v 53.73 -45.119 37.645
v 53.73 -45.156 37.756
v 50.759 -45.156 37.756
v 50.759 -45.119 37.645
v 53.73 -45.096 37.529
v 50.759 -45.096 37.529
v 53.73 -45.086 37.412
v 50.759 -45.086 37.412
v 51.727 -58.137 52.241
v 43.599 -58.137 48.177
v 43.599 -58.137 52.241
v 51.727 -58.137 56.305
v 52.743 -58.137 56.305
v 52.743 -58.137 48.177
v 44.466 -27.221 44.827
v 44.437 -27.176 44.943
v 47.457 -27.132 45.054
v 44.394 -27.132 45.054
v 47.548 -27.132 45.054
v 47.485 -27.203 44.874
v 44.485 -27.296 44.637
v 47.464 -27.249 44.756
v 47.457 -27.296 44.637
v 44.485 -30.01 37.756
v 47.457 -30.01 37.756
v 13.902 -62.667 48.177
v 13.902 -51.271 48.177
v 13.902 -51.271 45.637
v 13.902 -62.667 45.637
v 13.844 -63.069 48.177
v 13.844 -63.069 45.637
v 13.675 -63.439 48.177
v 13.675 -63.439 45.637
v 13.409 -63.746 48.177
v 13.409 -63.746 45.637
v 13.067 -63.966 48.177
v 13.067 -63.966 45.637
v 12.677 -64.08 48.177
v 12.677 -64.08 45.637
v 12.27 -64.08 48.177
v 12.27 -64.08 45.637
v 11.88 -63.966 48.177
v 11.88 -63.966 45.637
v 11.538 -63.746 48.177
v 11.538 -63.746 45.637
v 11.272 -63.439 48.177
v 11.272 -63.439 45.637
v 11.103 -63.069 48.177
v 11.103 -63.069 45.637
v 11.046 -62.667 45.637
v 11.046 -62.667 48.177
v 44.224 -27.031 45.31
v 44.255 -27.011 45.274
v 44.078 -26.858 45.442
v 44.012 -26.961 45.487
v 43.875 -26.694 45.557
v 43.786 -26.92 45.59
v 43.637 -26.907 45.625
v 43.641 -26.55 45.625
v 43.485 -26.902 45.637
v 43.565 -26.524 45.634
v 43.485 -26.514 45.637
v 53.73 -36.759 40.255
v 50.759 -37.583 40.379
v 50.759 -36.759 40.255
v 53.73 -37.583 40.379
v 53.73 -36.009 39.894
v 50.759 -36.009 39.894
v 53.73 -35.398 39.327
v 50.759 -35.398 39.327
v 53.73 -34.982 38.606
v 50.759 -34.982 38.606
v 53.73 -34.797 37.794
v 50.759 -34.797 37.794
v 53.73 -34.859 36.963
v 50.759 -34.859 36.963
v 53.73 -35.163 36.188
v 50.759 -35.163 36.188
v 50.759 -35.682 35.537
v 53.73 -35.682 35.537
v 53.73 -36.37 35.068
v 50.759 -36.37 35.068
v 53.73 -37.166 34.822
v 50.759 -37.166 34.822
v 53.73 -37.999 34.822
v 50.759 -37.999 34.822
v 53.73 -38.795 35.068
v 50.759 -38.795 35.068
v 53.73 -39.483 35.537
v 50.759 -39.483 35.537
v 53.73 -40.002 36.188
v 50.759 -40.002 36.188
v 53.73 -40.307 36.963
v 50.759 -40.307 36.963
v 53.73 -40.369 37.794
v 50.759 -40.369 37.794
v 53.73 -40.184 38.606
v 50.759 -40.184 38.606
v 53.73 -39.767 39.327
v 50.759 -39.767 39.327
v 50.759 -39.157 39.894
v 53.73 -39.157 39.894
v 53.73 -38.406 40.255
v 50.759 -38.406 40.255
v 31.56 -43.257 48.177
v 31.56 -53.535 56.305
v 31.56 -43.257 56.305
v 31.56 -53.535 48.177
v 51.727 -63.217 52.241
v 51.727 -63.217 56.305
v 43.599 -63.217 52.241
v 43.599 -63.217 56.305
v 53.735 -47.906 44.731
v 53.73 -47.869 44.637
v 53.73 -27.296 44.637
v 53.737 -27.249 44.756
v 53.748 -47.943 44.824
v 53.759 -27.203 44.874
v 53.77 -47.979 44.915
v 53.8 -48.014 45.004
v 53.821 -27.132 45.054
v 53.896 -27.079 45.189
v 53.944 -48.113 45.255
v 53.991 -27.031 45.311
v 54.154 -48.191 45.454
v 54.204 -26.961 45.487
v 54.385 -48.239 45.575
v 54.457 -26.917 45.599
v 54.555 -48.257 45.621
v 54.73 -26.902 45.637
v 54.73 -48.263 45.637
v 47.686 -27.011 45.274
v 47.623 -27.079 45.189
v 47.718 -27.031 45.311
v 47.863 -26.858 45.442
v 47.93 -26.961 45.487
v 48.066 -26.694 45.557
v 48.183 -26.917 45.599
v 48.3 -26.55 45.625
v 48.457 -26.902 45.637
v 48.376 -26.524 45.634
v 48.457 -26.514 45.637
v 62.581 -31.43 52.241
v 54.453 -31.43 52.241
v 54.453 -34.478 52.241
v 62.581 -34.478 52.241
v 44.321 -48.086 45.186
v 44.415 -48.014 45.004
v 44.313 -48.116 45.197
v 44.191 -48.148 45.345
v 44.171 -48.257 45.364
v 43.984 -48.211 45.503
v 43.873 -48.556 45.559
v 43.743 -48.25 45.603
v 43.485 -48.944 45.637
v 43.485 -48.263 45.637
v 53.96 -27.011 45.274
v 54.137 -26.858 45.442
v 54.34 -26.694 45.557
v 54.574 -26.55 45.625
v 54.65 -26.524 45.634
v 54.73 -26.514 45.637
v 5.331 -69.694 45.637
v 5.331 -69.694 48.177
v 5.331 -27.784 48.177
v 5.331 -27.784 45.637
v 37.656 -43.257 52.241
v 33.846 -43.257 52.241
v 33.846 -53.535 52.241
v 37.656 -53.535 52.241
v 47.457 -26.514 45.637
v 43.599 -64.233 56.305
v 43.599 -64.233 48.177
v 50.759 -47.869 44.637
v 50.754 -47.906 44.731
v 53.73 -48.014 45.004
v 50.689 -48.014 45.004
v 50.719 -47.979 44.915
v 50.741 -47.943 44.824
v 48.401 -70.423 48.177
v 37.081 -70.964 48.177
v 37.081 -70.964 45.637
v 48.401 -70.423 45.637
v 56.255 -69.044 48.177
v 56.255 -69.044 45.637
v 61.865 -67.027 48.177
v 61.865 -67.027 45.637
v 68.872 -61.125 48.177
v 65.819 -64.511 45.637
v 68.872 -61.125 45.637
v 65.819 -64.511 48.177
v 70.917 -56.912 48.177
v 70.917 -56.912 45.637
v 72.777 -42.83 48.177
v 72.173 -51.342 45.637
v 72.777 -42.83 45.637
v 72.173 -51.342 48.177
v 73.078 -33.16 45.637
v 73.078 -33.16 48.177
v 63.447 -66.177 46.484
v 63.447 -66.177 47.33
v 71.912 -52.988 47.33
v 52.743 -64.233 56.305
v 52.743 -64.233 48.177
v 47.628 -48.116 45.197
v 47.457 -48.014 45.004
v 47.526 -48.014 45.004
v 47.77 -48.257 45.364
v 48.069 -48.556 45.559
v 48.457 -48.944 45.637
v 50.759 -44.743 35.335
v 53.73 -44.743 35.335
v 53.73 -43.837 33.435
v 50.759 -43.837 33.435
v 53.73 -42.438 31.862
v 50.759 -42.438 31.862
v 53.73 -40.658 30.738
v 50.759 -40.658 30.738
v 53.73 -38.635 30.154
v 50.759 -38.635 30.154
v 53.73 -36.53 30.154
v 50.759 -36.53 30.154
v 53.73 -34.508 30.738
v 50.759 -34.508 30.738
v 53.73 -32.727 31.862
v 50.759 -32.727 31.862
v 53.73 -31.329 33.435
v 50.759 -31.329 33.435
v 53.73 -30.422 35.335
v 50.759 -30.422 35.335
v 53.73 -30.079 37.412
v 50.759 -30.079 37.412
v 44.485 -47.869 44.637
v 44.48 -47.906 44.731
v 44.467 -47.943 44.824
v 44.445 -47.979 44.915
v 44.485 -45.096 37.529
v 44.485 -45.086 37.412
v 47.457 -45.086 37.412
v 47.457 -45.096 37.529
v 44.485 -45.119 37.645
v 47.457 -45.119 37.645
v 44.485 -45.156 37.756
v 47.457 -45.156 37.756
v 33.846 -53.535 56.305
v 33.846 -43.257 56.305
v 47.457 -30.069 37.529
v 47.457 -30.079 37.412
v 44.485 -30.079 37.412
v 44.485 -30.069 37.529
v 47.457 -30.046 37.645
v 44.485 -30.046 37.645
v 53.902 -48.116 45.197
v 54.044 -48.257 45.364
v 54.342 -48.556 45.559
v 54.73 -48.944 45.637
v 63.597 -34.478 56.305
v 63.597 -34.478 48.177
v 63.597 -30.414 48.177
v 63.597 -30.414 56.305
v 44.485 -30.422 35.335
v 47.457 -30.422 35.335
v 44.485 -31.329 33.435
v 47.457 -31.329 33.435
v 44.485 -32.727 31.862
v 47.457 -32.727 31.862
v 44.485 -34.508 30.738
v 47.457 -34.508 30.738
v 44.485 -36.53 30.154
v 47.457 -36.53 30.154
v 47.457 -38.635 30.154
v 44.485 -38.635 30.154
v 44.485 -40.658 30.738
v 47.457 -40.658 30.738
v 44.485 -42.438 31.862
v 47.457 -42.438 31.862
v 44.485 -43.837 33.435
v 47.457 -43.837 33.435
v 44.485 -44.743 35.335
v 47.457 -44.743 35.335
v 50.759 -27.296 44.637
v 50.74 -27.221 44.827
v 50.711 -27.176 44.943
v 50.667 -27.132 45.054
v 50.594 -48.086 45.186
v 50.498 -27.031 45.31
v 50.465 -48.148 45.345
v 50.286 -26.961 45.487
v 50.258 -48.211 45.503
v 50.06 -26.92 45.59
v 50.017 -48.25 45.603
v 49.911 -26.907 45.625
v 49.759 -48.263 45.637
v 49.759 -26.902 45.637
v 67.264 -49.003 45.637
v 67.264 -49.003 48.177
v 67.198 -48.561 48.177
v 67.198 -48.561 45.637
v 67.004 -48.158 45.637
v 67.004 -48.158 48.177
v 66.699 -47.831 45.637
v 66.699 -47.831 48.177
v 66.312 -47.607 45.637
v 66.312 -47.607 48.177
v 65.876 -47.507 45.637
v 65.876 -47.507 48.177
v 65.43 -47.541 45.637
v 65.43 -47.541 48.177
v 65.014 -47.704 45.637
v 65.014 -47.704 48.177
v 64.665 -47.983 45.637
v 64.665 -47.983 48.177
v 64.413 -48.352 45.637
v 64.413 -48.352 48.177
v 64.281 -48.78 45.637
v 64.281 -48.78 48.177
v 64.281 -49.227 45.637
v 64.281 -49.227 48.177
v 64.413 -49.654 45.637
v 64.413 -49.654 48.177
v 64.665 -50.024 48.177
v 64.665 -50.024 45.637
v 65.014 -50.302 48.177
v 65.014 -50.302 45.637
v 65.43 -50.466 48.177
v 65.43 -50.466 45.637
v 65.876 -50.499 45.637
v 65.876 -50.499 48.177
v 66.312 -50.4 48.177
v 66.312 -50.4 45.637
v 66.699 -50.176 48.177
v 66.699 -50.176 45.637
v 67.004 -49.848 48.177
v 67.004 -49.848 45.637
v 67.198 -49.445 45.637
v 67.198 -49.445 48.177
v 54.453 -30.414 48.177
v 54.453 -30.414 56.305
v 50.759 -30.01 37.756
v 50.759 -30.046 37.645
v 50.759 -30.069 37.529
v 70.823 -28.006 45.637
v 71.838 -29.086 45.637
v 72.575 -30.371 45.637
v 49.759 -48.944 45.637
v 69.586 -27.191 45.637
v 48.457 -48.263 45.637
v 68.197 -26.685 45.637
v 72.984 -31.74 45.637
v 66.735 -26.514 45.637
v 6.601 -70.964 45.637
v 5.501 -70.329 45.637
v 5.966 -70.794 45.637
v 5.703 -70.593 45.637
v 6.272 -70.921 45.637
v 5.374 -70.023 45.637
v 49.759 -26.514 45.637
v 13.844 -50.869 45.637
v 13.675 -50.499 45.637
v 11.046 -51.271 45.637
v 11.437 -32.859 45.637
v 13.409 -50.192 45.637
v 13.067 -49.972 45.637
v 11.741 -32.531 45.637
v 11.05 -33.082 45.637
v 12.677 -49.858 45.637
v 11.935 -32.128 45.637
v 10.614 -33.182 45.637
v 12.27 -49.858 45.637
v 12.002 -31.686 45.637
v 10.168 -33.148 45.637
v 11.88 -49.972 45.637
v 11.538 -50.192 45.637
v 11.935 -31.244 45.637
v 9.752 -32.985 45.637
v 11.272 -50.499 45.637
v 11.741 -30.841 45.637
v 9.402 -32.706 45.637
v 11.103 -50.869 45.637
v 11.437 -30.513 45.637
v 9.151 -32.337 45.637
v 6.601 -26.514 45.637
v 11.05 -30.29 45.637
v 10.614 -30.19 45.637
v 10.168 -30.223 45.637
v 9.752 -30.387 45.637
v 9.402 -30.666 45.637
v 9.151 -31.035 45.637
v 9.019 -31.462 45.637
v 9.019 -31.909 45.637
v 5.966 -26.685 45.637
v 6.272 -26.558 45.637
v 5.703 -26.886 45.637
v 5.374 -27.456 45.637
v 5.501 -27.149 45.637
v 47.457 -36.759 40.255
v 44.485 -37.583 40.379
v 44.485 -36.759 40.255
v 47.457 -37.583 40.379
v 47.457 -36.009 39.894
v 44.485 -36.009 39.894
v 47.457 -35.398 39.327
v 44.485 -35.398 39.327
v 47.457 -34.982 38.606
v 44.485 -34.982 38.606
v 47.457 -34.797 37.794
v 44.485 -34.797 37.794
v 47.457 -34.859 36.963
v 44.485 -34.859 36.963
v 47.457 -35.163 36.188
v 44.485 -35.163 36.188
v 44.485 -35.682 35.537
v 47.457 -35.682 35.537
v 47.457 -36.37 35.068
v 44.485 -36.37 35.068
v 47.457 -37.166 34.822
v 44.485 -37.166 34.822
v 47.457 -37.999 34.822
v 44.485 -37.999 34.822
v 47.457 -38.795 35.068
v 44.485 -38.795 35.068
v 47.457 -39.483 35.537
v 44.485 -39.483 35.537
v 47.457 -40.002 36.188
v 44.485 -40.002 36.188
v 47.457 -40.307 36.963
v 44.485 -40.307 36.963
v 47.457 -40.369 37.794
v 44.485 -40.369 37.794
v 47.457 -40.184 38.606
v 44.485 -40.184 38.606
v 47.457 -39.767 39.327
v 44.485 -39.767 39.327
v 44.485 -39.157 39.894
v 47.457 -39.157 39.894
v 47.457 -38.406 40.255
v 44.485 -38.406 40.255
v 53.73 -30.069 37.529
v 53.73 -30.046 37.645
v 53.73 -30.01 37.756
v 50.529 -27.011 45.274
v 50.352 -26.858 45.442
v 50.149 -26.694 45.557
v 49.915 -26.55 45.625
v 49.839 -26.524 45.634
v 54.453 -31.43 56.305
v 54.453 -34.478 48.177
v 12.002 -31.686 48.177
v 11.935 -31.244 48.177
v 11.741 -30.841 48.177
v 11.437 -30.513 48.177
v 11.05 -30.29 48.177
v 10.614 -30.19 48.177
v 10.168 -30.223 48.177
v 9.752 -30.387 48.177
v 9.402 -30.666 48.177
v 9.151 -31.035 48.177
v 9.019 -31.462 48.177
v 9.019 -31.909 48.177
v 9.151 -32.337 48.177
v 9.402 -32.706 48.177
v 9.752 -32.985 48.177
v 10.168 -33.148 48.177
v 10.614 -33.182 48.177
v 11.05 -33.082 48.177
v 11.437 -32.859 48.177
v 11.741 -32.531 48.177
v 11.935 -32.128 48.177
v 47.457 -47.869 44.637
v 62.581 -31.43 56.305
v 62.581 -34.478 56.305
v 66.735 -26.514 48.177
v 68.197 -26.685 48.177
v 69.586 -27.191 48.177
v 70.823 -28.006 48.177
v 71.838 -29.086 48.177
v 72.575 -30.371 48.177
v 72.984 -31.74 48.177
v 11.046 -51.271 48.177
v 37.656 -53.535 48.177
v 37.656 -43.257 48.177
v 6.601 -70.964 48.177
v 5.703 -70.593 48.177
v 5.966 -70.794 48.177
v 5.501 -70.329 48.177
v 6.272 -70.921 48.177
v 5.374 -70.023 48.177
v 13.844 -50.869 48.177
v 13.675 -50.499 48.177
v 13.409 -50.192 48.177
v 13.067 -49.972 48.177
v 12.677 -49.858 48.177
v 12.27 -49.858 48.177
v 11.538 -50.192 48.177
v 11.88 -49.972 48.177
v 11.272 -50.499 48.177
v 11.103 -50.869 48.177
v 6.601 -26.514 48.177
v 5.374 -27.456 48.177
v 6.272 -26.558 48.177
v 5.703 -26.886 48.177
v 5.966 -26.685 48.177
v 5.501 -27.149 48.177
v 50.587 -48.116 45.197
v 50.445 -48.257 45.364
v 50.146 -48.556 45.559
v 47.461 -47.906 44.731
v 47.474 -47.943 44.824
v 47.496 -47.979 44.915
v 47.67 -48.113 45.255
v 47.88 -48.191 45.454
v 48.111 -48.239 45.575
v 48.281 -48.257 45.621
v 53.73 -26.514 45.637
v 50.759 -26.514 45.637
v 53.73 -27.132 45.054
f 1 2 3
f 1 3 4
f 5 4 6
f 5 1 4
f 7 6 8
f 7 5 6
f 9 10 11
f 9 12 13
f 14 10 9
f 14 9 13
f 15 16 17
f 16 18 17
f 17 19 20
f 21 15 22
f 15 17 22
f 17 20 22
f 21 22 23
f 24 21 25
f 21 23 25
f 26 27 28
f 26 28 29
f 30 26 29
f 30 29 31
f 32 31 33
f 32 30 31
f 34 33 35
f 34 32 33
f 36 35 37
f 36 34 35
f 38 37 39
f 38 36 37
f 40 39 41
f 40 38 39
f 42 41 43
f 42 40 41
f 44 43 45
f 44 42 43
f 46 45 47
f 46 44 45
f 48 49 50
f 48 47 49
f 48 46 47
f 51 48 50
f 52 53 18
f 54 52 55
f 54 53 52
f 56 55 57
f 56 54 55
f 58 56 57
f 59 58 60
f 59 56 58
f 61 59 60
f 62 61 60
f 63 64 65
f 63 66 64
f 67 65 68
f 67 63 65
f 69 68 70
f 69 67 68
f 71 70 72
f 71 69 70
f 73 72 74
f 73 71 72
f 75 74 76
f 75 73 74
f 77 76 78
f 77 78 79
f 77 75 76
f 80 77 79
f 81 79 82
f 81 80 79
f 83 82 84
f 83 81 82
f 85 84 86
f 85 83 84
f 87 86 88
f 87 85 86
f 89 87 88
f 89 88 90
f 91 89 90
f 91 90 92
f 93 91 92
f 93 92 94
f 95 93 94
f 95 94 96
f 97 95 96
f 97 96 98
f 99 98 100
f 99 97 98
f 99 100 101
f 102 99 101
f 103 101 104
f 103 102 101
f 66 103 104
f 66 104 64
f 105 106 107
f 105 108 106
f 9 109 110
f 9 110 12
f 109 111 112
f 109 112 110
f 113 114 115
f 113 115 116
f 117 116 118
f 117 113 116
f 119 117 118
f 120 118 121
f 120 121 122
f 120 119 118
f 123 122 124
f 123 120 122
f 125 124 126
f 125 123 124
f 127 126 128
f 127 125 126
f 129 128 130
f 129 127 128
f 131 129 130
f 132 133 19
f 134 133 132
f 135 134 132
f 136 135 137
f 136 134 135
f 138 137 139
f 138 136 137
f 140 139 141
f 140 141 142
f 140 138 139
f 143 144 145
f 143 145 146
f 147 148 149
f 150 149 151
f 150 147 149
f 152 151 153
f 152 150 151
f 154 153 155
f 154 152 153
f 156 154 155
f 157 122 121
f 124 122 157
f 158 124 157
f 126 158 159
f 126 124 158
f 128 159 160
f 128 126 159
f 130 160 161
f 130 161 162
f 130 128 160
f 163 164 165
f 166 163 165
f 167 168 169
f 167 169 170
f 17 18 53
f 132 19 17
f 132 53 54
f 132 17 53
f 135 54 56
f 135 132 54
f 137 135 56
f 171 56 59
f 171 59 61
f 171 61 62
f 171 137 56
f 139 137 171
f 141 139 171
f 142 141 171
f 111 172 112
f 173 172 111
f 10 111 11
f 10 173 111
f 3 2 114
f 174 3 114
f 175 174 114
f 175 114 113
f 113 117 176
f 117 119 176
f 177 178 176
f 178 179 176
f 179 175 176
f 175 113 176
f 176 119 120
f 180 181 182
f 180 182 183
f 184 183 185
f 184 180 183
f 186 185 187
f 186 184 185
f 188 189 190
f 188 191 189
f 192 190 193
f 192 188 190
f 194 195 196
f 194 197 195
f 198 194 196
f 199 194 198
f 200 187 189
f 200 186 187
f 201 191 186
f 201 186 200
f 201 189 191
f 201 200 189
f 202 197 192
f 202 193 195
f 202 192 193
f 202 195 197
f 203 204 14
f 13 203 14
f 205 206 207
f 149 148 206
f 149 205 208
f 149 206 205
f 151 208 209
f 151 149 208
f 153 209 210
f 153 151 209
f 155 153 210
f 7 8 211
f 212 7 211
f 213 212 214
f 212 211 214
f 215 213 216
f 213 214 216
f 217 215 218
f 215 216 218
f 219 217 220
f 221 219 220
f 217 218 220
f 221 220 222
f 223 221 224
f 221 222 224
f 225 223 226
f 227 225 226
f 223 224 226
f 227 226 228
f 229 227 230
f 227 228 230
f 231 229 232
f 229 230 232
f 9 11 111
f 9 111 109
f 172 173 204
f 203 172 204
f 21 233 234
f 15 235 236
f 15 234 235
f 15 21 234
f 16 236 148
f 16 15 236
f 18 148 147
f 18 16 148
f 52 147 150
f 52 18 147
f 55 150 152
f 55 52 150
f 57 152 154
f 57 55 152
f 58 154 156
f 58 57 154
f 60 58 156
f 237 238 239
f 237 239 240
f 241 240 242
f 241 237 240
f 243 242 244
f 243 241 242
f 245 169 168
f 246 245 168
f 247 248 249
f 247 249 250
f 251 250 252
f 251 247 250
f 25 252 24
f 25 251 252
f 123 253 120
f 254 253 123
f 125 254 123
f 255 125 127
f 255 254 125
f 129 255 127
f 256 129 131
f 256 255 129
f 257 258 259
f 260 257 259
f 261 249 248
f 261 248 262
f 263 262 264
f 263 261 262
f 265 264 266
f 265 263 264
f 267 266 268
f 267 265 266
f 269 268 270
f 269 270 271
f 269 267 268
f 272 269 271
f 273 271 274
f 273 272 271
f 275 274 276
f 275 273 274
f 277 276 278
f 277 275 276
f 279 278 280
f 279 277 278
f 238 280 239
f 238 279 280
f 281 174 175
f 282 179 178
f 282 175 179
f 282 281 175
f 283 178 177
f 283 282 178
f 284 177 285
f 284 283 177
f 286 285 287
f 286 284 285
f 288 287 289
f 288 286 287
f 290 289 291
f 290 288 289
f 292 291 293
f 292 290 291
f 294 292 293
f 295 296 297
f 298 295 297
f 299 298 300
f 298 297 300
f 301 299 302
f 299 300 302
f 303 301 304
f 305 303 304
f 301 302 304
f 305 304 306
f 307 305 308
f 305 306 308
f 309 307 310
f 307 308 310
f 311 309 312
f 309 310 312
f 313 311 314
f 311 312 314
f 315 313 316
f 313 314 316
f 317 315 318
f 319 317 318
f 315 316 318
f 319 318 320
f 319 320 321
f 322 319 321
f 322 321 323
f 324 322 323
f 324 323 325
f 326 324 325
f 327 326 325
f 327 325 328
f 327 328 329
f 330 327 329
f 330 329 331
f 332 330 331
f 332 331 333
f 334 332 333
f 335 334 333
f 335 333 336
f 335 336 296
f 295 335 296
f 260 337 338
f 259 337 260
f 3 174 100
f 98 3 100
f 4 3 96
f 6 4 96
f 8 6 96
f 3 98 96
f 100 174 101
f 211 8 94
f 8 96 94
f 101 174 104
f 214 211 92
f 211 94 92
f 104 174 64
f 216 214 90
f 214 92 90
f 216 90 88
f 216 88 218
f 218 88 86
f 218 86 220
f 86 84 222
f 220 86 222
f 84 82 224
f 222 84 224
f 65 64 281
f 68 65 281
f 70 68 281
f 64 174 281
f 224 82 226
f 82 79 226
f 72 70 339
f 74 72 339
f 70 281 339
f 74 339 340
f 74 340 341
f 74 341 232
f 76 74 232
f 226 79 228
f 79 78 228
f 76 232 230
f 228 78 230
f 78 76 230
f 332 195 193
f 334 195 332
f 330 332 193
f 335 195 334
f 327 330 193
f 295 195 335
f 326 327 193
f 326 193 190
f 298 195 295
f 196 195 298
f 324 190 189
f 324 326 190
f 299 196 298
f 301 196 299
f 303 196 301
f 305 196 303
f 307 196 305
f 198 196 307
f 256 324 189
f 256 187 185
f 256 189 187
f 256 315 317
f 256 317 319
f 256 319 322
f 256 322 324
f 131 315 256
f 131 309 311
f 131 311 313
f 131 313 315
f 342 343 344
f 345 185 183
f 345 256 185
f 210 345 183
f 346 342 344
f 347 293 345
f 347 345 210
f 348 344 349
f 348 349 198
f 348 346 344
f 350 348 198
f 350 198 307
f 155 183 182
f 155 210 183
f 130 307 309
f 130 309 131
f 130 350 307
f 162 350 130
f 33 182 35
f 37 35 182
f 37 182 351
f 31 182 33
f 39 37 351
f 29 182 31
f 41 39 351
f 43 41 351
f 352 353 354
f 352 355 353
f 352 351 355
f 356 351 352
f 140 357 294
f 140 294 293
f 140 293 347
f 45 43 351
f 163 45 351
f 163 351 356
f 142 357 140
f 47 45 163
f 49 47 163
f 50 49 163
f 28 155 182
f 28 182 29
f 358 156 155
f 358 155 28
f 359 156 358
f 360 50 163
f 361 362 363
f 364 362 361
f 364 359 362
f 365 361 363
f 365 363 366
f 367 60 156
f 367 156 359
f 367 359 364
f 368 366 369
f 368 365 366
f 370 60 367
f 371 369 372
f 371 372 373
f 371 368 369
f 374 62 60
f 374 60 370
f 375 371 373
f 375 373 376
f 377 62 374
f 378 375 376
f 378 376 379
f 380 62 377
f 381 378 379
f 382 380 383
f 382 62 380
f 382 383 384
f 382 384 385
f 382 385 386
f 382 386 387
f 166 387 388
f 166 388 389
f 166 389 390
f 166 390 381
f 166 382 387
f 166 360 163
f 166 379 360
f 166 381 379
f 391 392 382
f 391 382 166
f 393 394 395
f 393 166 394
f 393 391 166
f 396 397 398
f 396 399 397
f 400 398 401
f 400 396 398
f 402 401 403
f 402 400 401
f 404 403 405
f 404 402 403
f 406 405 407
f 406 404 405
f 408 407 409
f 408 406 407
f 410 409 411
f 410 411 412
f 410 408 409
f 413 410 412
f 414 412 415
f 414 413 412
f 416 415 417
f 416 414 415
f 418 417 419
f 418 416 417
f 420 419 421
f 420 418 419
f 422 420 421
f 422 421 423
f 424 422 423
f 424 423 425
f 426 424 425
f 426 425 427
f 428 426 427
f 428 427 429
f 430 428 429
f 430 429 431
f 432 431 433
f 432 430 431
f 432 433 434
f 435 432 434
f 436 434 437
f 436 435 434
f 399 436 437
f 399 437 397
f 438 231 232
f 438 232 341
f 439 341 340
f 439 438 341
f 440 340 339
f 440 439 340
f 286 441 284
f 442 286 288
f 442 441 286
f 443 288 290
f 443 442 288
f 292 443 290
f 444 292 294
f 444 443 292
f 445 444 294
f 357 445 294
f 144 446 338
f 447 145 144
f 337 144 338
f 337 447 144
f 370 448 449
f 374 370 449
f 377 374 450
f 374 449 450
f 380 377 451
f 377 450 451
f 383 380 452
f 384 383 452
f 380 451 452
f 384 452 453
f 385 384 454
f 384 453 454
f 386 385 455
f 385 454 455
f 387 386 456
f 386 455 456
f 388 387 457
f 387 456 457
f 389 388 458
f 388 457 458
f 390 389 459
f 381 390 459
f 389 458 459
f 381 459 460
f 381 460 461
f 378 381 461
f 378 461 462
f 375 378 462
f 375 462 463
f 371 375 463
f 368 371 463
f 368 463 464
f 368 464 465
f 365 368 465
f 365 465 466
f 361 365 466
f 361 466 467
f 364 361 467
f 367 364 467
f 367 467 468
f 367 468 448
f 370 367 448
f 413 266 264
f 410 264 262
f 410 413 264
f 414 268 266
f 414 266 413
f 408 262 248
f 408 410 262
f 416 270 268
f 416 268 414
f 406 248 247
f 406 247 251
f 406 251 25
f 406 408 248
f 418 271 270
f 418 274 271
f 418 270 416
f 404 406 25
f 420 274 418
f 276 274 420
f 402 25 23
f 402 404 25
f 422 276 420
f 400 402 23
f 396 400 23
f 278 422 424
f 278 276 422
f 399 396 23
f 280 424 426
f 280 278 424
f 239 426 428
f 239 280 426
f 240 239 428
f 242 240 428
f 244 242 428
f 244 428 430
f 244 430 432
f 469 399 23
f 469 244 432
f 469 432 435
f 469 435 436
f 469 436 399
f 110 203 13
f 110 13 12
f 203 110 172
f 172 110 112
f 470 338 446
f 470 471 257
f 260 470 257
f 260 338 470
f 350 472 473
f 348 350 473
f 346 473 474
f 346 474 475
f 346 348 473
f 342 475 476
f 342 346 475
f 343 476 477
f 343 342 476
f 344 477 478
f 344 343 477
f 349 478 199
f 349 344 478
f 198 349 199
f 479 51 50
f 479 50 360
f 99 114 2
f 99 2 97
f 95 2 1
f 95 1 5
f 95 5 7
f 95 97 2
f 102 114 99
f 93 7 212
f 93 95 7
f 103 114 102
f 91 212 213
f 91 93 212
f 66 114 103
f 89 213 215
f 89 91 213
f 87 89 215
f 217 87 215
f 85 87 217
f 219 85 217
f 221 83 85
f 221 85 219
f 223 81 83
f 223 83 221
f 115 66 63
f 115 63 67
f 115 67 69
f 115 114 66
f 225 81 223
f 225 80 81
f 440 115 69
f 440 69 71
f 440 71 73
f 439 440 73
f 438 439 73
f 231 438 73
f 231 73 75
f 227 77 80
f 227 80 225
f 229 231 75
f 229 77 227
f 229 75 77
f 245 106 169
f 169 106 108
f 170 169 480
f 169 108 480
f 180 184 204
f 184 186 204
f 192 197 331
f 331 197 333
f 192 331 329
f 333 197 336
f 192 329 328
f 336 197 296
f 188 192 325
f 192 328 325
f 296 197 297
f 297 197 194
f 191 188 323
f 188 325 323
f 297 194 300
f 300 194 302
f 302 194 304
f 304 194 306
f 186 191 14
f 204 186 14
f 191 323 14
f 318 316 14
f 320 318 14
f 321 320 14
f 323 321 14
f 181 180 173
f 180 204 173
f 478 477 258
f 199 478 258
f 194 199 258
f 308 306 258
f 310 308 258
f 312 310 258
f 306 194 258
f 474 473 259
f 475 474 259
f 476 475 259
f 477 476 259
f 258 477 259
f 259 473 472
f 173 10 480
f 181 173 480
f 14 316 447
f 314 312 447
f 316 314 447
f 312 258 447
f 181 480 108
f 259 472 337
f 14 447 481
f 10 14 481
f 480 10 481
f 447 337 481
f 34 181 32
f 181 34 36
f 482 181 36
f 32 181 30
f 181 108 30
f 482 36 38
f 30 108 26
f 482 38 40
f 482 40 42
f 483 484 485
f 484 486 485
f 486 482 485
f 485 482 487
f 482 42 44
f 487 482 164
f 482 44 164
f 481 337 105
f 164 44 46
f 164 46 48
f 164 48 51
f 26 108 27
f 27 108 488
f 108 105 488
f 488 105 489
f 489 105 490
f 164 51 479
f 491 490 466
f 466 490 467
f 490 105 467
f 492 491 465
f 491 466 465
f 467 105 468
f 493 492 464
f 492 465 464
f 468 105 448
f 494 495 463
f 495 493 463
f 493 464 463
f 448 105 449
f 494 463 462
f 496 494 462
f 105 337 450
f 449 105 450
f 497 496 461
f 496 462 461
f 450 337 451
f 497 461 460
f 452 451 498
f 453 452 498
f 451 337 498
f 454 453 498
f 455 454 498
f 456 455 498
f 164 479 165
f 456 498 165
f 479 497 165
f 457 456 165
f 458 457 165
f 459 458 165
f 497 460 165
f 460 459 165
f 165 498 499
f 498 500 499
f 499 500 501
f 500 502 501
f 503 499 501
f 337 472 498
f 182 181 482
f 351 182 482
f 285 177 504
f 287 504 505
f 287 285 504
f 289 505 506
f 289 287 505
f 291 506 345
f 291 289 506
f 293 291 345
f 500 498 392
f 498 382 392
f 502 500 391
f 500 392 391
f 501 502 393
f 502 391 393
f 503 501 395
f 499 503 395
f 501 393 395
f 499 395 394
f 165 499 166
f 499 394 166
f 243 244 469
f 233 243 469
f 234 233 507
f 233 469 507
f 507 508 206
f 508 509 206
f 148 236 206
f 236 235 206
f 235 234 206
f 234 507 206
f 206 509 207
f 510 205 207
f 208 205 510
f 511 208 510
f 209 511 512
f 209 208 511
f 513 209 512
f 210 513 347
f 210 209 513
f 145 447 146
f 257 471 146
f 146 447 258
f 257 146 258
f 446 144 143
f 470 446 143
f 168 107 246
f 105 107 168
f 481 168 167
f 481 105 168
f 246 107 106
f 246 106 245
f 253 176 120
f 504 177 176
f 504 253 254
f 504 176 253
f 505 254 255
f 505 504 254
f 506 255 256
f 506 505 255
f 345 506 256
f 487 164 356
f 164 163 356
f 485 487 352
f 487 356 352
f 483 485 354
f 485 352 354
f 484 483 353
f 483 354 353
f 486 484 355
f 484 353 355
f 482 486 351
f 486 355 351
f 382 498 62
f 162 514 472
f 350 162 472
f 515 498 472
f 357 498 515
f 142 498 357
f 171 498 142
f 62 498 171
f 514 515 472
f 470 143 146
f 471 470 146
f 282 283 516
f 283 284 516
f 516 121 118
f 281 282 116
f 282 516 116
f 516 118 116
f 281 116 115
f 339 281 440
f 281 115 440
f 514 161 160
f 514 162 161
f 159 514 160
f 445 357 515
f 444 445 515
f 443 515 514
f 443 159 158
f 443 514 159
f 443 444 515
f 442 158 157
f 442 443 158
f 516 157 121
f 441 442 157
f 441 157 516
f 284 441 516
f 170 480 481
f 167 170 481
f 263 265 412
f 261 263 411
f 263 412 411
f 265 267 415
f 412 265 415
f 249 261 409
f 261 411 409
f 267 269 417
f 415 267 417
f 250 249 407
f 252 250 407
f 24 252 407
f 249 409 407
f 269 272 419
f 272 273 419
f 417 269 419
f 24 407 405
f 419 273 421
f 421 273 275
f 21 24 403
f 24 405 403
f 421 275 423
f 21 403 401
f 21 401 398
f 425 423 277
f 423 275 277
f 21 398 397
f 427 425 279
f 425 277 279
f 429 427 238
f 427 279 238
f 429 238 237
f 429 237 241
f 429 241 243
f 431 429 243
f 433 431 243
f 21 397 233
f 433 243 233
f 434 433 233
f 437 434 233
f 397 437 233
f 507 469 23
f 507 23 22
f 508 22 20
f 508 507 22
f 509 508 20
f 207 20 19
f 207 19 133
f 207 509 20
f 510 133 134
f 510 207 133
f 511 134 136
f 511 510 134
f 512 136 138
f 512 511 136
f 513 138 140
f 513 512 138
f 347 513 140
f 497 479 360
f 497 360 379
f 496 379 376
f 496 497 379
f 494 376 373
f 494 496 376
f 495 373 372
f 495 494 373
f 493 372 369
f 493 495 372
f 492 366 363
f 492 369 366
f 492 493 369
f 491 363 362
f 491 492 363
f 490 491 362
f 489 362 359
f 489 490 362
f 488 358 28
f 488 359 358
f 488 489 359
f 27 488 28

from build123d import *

# Parameters (mm, degrees)
BOSS_EXTRUDE1_DEPTH = 2.54
SKETCH8_R           = 2.794
BOSS_EXTRUDE5_DEPTH = 1.4859
SKETCH9_R           = 2.794
BOSS_EXTRUDE6_DEPTH = 1.4859
FILLET1_R           = 6.35
FILLET2_R           = 1.27
SKETCH11_R          = 1.5
CUT_EXTRUDE1_DEPTH  = 104.464232939
CUT_EXTRUDE3_DEPTH  = 104.464232939
SKETCH14_W          = 9.144
SKETCH14_H          = 6.096
SKETCH14_W_2        = 6.096
SKETCH14_H_2        = 10.277436068
SKETCH14_H_3        = 4.064
BOSS_EXTRUDE7_DEPTH = 4.064
SKETCH15_W          = 2.286
SKETCH15_H          = 10.277436068
BOSS_EXTRUDE8_DEPTH = 4.064
FILLET3_R           = 1


with BuildPart() as part:
    # Sketch3 → Boss-Extrude1 (new body)
    with BuildSketch(Plane(origin=(0, 0, 48.176932074), x_dir=(-1, 0, 0), z_dir=(0, 0, -1))):
        with BuildLine():
            Line((-5.330605085, -70.964477634), (-5.330605085, -26.514477634))
            Line((-5.330605085, -26.514477634), (-73.555005085, -26.514477634))
            add(Edge.make_bspline(
                [(-37.080605085, -70.964477634), (-79.637463047, -70.964477634), (-70.893021391, -52.676234808), (-73.555005085, -26.514477634)],
                knots=[0, 0, 0, 0, 1, 1, 1, 1], degree=3))
            Line((-37.080605085, -70.964477634), (-5.330605085, -70.964477634))
        make_face()
    extrude(amount=BOSS_EXTRUDE1_DEPTH)

    # Sketch8 → Boss-Extrude5 (add, symmetric)
    with BuildSketch(Plane.ZY.offset(-45.970605085)):
        with BuildLine():
            Line((45.636932074, -45.088449611), (45.636932074, -30.077049611))
            Line((45.636932074, -30.077049611), (45.636932074, -26.902049611))
            Line((45.636932074, -26.902049611), (37.585132074, -30.077049611))
            ThreePointArc((37.585132074, -30.077049611), (30.079432074, -37.582749611), (37.585132074, -45.088449611))
            Line((37.585132074, -45.088449611), (45.636932074, -48.263449611))
            Line((45.636932074, -48.263449611), (45.636932074, -45.088449611))
        make_face()
        with Locations((37.585132074, -37.582749611)):
            Circle(SKETCH8_R, mode=Mode.SUBTRACT)
    extrude(amount=BOSS_EXTRUDE5_DEPTH, both=True)

    # Sketch9 → Boss-Extrude6 (add, symmetric)
    with BuildSketch(Plane.ZY.offset(-52.244405085)):
        with BuildLine():
            Line((37.585132074, -30.077049611), (45.636932074, -26.902049611))
            Line((45.636932074, -26.902049611), (45.636932074, -30.077049611))
            Line((45.636932074, -30.077049611), (45.636932074, -45.088449611))
            Line((45.636932074, -45.088449611), (45.636932074, -48.263449611))
            Line((45.636932074, -48.263449611), (37.585132074, -45.088449611))
            ThreePointArc((37.585132074, -45.088449611), (30.079432074, -37.582749611), (37.585132074, -30.077049611))
        make_face()
        with Locations((37.585132074, -37.582749611)):
            Circle(SKETCH9_R, mode=Mode.SUBTRACT)
    extrude(amount=BOSS_EXTRUDE6_DEPTH, both=True)

    # Fillet1
    fillet1_edges = [part.edges().sort_by_distance(p)[0] for p in [
        (73.555005085, -26.514477634, 46.906932074),
    ]]
    fillet(fillet1_edges, radius=FILLET1_R)

    # Fillet2
    fillet2_edges = [part.edges().sort_by_distance(p)[0] for p in [
        (5.330605085, -26.514477634, 46.906932074),
        (5.330605085, -70.964477634, 46.906932074),
    ]]
    fillet(fillet2_edges, radius=FILLET2_R)

    # Sketch11 → Cut-Extrude1 (cut, through all)
    with BuildSketch(Plane.XY.offset(48.176932074)):
        with Locations((10.501991532, -31.685864082)):
            Circle(SKETCH11_R)
        with Locations((65.764167989, -49.003253007)):
            Circle(SKETCH11_R)
    extrude(amount=-CUT_EXTRUDE1_DEPTH, mode=Mode.SUBTRACT)

    # Sketch13 → Cut-Extrude3 (cut, through all)
    with BuildSketch(Plane.XY.offset(48.176932074)):
        with BuildLine():
            Line((11.045605085, -62.666787944), (11.045605085, -51.271162116))
            ThreePointArc((11.045605085, -51.271162116), (12.473581383, -49.843185817), (13.901557682, -51.271162116))
            Line((13.901557682, -51.271162116), (13.901557682, -62.666787944))
            ThreePointArc((13.901557682, -62.666787944), (12.473581383, -64.094764243), (11.045605085, -62.666787944))
        make_face()
    extrude(amount=-CUT_EXTRUDE3_DEPTH, mode=Mode.SUBTRACT)

    # Sketch14 → Boss-Extrude7 (add)
    with BuildSketch(Plane.XY.offset(48.176932074)):
        with Locations((48.170658264, -61.185477634)):
            Rectangle(SKETCH14_W, SKETCH14_H)
        with Locations((34.607686971, -48.396046186)):
            Rectangle(SKETCH14_W_2, SKETCH14_H_2)
        with Locations((59.024762651, -32.446016036)):
            Rectangle(SKETCH14_W, SKETCH14_H_3)
    extrude(amount=BOSS_EXTRUDE7_DEPTH)

    # Sketch15 → Boss-Extrude8 (add)
    with BuildSketch(Plane.XY.offset(52.240932074)):
        with Locations((32.702686971, -48.396046186)):
            Rectangle(SKETCH15_W, SKETCH15_H)
        Polygon((54.452762651, -30.414016036), (54.452762651, -31.430016036), (62.580762651, -31.430016036), (62.580762651, -34.478016036), (63.596762651, -34.478016036), (63.596762651, -30.414016036), align=None)
        Polygon((43.598658264, -63.217477634), (51.726658264, -63.217477634), (51.726658264, -58.137477634), (52.742658264, -58.137477634), (52.742658264, -64.233477634), (43.598658264, -64.233477634), align=None)
    extrude(amount=BOSS_EXTRUDE8_DEPTH)

    # Fillet3
    # the kernel refuses this fillet: 1 mm, written as the material it adds along each edge
    with BuildSketch(Plane(origin=(44.484705085, -24.402049611, 45.636932074), x_dir=(-1, 0, 0), z_dir=(0, -1, 0))) as fillet3_piece_1_section:
        with BuildLine():
            CenterArc((FILLET3_R, FILLET3_R), FILLET3_R, 180, 90)
            Line((0, FILLET3_R), (-FILLET3_R * 0.02, FILLET3_R))
            Line((-FILLET3_R * 0.02, FILLET3_R), (-FILLET3_R * 0.02, -FILLET3_R * 0.02))
            Line((-FILLET3_R * 0.02, -FILLET3_R * 0.02), (FILLET3_R, -FILLET3_R * 0.02))
            Line((FILLET3_R, -FILLET3_R * 0.02), (FILLET3_R, 0))
        make_face()
    fillet3_piece_1 = extrude(amount=26.3614, mode=Mode.PRIVATE)
    fillet3_piece_1 = split(fillet3_piece_1, bisect_by=Plane(origin=(44.257287749, -28.415977986, 41.797609716), z_dir=(0, -0.9302870363838799, 0.36683242759616796)), keep=Keep.TOP, mode=Mode.PRIVATE)
    fillet3_piece_1 = split(fillet3_piece_1, bisect_by=Plane(origin=(44.257287749, -46.749521237, 41.797609716), z_dir=(0, 0.9302870363838802, 0.36683242759616724)), keep=Keep.TOP, mode=Mode.PRIVATE)
    add(fillet3_piece_1)
    with BuildSketch(Plane(origin=(47.456505085, -30.077049611, 37.585132074), x_dir=(0, -0.011507965676518926, -0.9999337811705274), z_dir=(-1, 0, 0)), Plane(origin=(44.484705085, -45.088449611, 37.585132074), x_dir=(0, 0.011507965676519873, -0.9999337811705273), z_dir=(1, 0, 0)), Plane(origin=(53.730305085, -30.077049611, 37.585132074), x_dir=(0, -0.011507965676498363, -0.9999337811705276), z_dir=(-1, 0, 0))) as fillet3_piece_2:
        with BuildLine():
            CenterArc((0.184258642, -0.999933781), FILLET3_R, 90.659372418, 20.20165218)
            Line((-0.171843783, -0.065486852), (-0.178965832, -0.046797914))
            Line((-0.178965832, -0.046797914), (-0.007122049, 0.018688939))
            Line((-0.007122049, 0.018688939), (0.000230159, 0.019998676))
            ThreePointArc((0.000230159, 0.019998676), (0.086375338, 0.019502981), (0.172520517, 0.019998676))
            Line((0.172520517, 0.019998676), (0.172750676, 0))
        make_face()
    extrude(amount=2.9718)
    with BuildSketch(Plane(origin=(47.456505085, -50.763449611, 45.636932074), x_dir=(1, 0, 0), z_dir=(0, 1, 0))) as fillet3_piece_3_section:
        with BuildLine():
            CenterArc((FILLET3_R, FILLET3_R), FILLET3_R, 180, 90)
            Line((0, FILLET3_R), (-FILLET3_R * 0.02, FILLET3_R))
            Line((-FILLET3_R * 0.02, FILLET3_R), (-FILLET3_R * 0.02, -FILLET3_R * 0.02))
            Line((-FILLET3_R * 0.02, -FILLET3_R * 0.02), (FILLET3_R, -FILLET3_R * 0.02))
            Line((FILLET3_R, -FILLET3_R * 0.02), (FILLET3_R, 0))
        make_face()
    fillet3_piece_3 = extrude(amount=26.3614, mode=Mode.PRIVATE)
    fillet3_piece_3 = split(fillet3_piece_3, bisect_by=Plane(origin=(47.68392242, -28.415977986, 41.797609716), z_dir=(0, -0.9302870363838799, 0.36683242759616796)), keep=Keep.TOP, mode=Mode.PRIVATE)
    fillet3_piece_3 = split(fillet3_piece_3, bisect_by=Plane(origin=(47.68392242, -46.749521237, 41.797609716), z_dir=(0, 0.9302870363838802, 0.36683242759616724)), keep=Keep.TOP, mode=Mode.PRIVATE)
    add(fillet3_piece_3)
    with BuildSketch(Plane(origin=(44.484705085, -48.263449611, 45.636932074), x_dir=(0, -1, 0), z_dir=(1, 0, 0)), Plane(origin=(50.758505085, -48.263449611, 45.636932074), x_dir=(0, -1, 0), z_dir=(1, 0, 0))) as fillet3_piece_4:
        with BuildLine():
            CenterArc((FILLET3_R * 0.680615280704, FILLET3_R), FILLET3_R, 201.520397017, 68.479602983)
            Line((-FILLET3_R * 0.24967175568, FILLET3_R * 0.633167572404), (-FILLET3_R * 0.268277496407, FILLET3_R * 0.625830923852))
            Line((-FILLET3_R * 0.268277496407, FILLET3_R * 0.625830923852), (-FILLET3_R * 0.0136123056141, -FILLET3_R * 0.02))
            Line((-FILLET3_R * 0.0136123056141, -FILLET3_R * 0.02), (FILLET3_R * 0.680615280704, -FILLET3_R * 0.02))
            Line((FILLET3_R * 0.680615280704, -FILLET3_R * 0.02), (FILLET3_R * 0.680615280704, 0))
        make_face()
    extrude(amount=2.9718)
    with BuildSketch(Plane(origin=(47.456505085, -26.902049611, 45.636932074), x_dir=(0, 1, 0), z_dir=(-1, 0, 0))) as fillet3_piece_5:
        with BuildLine():
            CenterArc((0.700407326, 0.949807372), FILLET3_R, 201.520397017, 50.249417843)
            Line((-0.22987971, 0.582974945), (-0.248485451, 0.575638296))
            Line((-0.248485451, 0.575638296), (-0.018605741, -0.007336649))
            Line((-0.018605741, -0.007336649), (0, -0.02))
            ThreePointArc((0, -0.02), (0.193785989, -0.02), (0.38131527, -0.018996147))
            Line((0.38131527, -0.018996147), (0.387571977, 0))
        make_face()
    extrude(amount=2.9718)
    with BuildSketch(Plane(origin=(50.758505085, -24.402049611, 45.636932074), x_dir=(-1, 0, 0), z_dir=(0, -1, 0))) as fillet3_piece_6_section:
        with BuildLine():
            CenterArc((FILLET3_R, FILLET3_R), FILLET3_R, 180, 90)
            Line((0, FILLET3_R), (-FILLET3_R * 0.02, FILLET3_R))
            Line((-FILLET3_R * 0.02, FILLET3_R), (-FILLET3_R * 0.02, -FILLET3_R * 0.02))
            Line((-FILLET3_R * 0.02, -FILLET3_R * 0.02), (FILLET3_R, -FILLET3_R * 0.02))
            Line((FILLET3_R, -FILLET3_R * 0.02), (FILLET3_R, 0))
        make_face()
    fillet3_piece_6 = extrude(amount=26.3614, mode=Mode.PRIVATE)
    fillet3_piece_6 = split(fillet3_piece_6, bisect_by=Plane(origin=(50.531087749, -46.749521237, 41.797609716), z_dir=(0, 0.9302870363838802, 0.36683242759616724)), keep=Keep.TOP, mode=Mode.PRIVATE)
    fillet3_piece_6 = split(fillet3_piece_6, bisect_by=Plane(origin=(50.531087749, -28.415977986, 41.797609716), z_dir=(0, -0.9302870363838799, 0.36683242759616835)), keep=Keep.TOP, mode=Mode.PRIVATE)
    add(fillet3_piece_6)
    with BuildSketch(Plane(origin=(50.758505085, -26.902049611, 45.636932074), x_dir=(0, 1, 0), z_dir=(1, 0, 0))) as fillet3_piece_7:
        with BuildLine():
            CenterArc((0.700407326, -0.949807372), FILLET3_R, 108.23018514, 50.249417843)
            Line((-0.22987971, -0.582974945), (-0.248485451, -0.575638296))
            Line((-0.248485451, -0.575638296), (-0.018605741, 0.007336649))
            Line((-0.018605741, 0.007336649), (0, 0.02))
            ThreePointArc((0, 0.02), (0.193785989, 0.02), (0.38131527, 0.018996147))
            Line((0.38131527, 0.018996147), (0.387571977, 0))
        make_face()
    extrude(amount=2.9718)
    with BuildSketch(Plane(origin=(53.730305085, -45.088449611, 37.585132074), x_dir=(0, -0.3668324275961554, 0.9302870363838848), z_dir=(-1, 0, 0))) as fillet3_piece_8:
        with BuildLine():
            CenterArc((0.183898923, -1), FILLET3_R, 90, 20.20165218)
            Line((-0.161426339, -0.061516935), (-0.168332844, -0.042747273))
            ThreePointArc((-0.168332844, -0.042747273), (-0.087658228, -0.012533966), (-0.007336649, 0.018605741))
            Line((-0.007336649, 0.018605741), (0, 0.02))
            Line((0, 0.02), (0.183898923, 0.02))
            Line((0.183898923, 0.02), (0.183898923, 0))
        make_face()
    extrude(amount=2.9718)
    with BuildSketch(Plane(origin=(53.730305085, -50.763449611, 45.636932074), x_dir=(1, 0, 0), z_dir=(0, 1, 0))) as fillet3_piece_9_section:
        with BuildLine():
            CenterArc((FILLET3_R, FILLET3_R), FILLET3_R, 180, 90)
            Line((0, FILLET3_R), (-FILLET3_R * 0.02, FILLET3_R))
            Line((-FILLET3_R * 0.02, FILLET3_R), (-FILLET3_R * 0.02, -FILLET3_R * 0.02))
            Line((-FILLET3_R * 0.02, -FILLET3_R * 0.02), (FILLET3_R, -FILLET3_R * 0.02))
            Line((FILLET3_R, -FILLET3_R * 0.02), (FILLET3_R, 0))
        make_face()
    fillet3_piece_9 = extrude(amount=26.3614, mode=Mode.PRIVATE)
    fillet3_piece_9 = split(fillet3_piece_9, bisect_by=Plane(origin=(53.95772242, -46.749521237, 41.797609716), z_dir=(0, 0.9302870363838802, 0.36683242759616724)), keep=Keep.TOP, mode=Mode.PRIVATE)
    fillet3_piece_9 = split(fillet3_piece_9, bisect_by=Plane(origin=(53.95772242, -28.415977986, 41.797609716), z_dir=(0, -0.9302870363838799, 0.36683242759616835)), keep=Keep.TOP, mode=Mode.PRIVATE)
    add(fillet3_piece_9)
    with BuildSketch(Plane(origin=(47.456505085, -26.902049611, 45.636932074), x_dir=(0, 1, 0), z_dir=(-1, 0, 0))) as fillet3_piece_10a_section:
        with BuildLine():
            CenterArc((0.700407326, 0.949807372), FILLET3_R, 201.520397017, 50.249417843)
            Line((-0.22987971, 0.582974945), (-0.248485451, 0.575638296))
            Line((-0.248485451, 0.575638296), (-0.018605741, -0.007336649))
            Line((-0.018605741, -0.007336649), (0, -0.02))
            ThreePointArc((0, -0.02), (0.193785989, -0.02), (0.38131527, -0.018996147))
            Line((0.38131527, -0.018996147), (0.387571977, 0))
        make_face()
    fillet3_piece_10a = extrude(amount=4.538453414, mode=Mode.PRIVATE)
    fillet3_piece_10a = split(fillet3_piece_10a, bisect_by=Plane(origin=(44.484705085, -26.864445024, 45.495418853), z_dir=(-1, 0, 0)), keep=Keep.TOP, mode=Mode.PRIVATE)
    with BuildSketch(Plane(origin=(44.484705085, -24.402049611, 45.636932074), x_dir=(-1, 0, 0), z_dir=(0, -1, 0))) as fillet3_piece_10b_section:
        with BuildLine():
            CenterArc((FILLET3_R, FILLET3_R), FILLET3_R, 180, 90)
            Line((0, FILLET3_R), (-FILLET3_R * 0.02, FILLET3_R))
            Line((-FILLET3_R * 0.02, FILLET3_R), (-FILLET3_R * 0.02, -FILLET3_R * 0.02))
            Line((-FILLET3_R * 0.02, -FILLET3_R * 0.02), (FILLET3_R, -FILLET3_R * 0.02))
            Line((FILLET3_R, -FILLET3_R * 0.02), (FILLET3_R, 0))
        make_face()
    fillet3_piece_10b = extrude(amount=26.3614, mode=Mode.PRIVATE)
    fillet3_piece_10b = split(fillet3_piece_10b, bisect_by=Plane(origin=(44.281015021, -26.514477634, 45.372103573), z_dir=(0, -1, 0)), keep=Keep.TOP, mode=Mode.PRIVATE)
    fillet3_piece_10b = split(fillet3_piece_10b, bisect_by=Plane(origin=(44.281015021, -26.973374036, 45.456053333), z_dir=(0, 0.9302870363838799, -0.36683242759616796)), keep=Keep.TOP, mode=Mode.PRIVATE)
    fillet3_piece_10 = fillet3_piece_10a & fillet3_piece_10b
    add(fillet3_piece_10)
    with BuildSketch(Plane(origin=(42.783166883, -48.263449611, 45.636932074), x_dir=(0, -1, 0), z_dir=(1, 0, 0))) as fillet3_piece_11a_section:
        with BuildLine():
            CenterArc((FILLET3_R * 0.680615280704, FILLET3_R), FILLET3_R, 201.520397017, 68.479602983)
            Line((-FILLET3_R * 0.24967175568, FILLET3_R * 0.633167572404), (-FILLET3_R * 0.268277496407, FILLET3_R * 0.625830923852))
            Line((-FILLET3_R * 0.268277496407, FILLET3_R * 0.625830923852), (-FILLET3_R * 0.0136123056141, -FILLET3_R * 0.02))
            Line((-FILLET3_R * 0.0136123056141, -FILLET3_R * 0.02), (FILLET3_R * 0.680615280704, -FILLET3_R * 0.02))
            Line((FILLET3_R * 0.680615280704, -FILLET3_R * 0.02), (FILLET3_R * 0.680615280704, 0))
        make_face()
    fillet3_piece_11a = extrude(amount=4.673338202, mode=Mode.PRIVATE)
    fillet3_piece_11a = split(fillet3_piece_11a, bisect_by=Plane(origin=(44.484705085, -48.357764725, 45.498358762), z_dir=(-1, 0, 0)), keep=Keep.TOP, mode=Mode.PRIVATE)
    with BuildSketch(Plane(origin=(44.484705085, -24.402049611, 45.636932074), x_dir=(-1, 0, 0), z_dir=(0, -1, 0))) as fillet3_piece_11b_section:
        with BuildLine():
            CenterArc((FILLET3_R, FILLET3_R), FILLET3_R, 180, 90)
            Line((0, FILLET3_R), (-FILLET3_R * 0.02, FILLET3_R))
            Line((-FILLET3_R * 0.02, FILLET3_R), (-FILLET3_R * 0.02, -FILLET3_R * 0.02))
            Line((-FILLET3_R * 0.02, -FILLET3_R * 0.02), (FILLET3_R, -FILLET3_R * 0.02))
            Line((FILLET3_R, -FILLET3_R * 0.02), (FILLET3_R, 0))
        make_face()
    fillet3_piece_11b = extrude(amount=26.3614, mode=Mode.PRIVATE)
    fillet3_piece_11b = split(fillet3_piece_11b, bisect_by=Plane(origin=(44.262491368, -48.345787947, 45.845742093), z_dir=(0, -0.9302870363838802, -0.36683242759616724)), keep=Keep.TOP, mode=Mode.PRIVATE)
    fillet3_piece_11 = fillet3_piece_11a & fillet3_piece_11b
    add(fillet3_piece_11)
    with BuildSketch(Plane(origin=(47.456505085, -50.763449611, 45.636932074), x_dir=(1, 0, 0), z_dir=(0, 1, 0))) as fillet3_piece_12a_section:
        with BuildLine():
            CenterArc((FILLET3_R, FILLET3_R), FILLET3_R, 180, 90)
            Line((0, FILLET3_R), (-FILLET3_R * 0.02, FILLET3_R))
            Line((-FILLET3_R * 0.02, FILLET3_R), (-FILLET3_R * 0.02, -FILLET3_R * 0.02))
            Line((-FILLET3_R * 0.02, -FILLET3_R * 0.02), (FILLET3_R, -FILLET3_R * 0.02))
            Line((FILLET3_R, -FILLET3_R * 0.02), (FILLET3_R, 0))
        make_face()
    fillet3_piece_12a = extrude(amount=26.3614, mode=Mode.PRIVATE)
    fillet3_piece_12a = split(fillet3_piece_12a, bisect_by=Plane(origin=(47.678718801, -48.345787947, 45.845742093), z_dir=(0, -0.9302870363838802, -0.36683242759616724)), keep=Keep.TOP, mode=Mode.PRIVATE)
    with BuildSketch(Plane(origin=(44.484705085, -48.263449611, 45.636932074), x_dir=(0, -1, 0), z_dir=(1, 0, 0))) as fillet3_piece_12b_section:
        with BuildLine():
            CenterArc((FILLET3_R * 0.680615280704, FILLET3_R), FILLET3_R, 201.520397017, 68.479602983)
            Line((-FILLET3_R * 0.24967175568, FILLET3_R * 0.633167572404), (-FILLET3_R * 0.268277496407, FILLET3_R * 0.625830923852))
            Line((-FILLET3_R * 0.268277496407, FILLET3_R * 0.625830923852), (-FILLET3_R * 0.0136123056141, -FILLET3_R * 0.02))
            Line((-FILLET3_R * 0.0136123056141, -FILLET3_R * 0.02), (FILLET3_R * 0.680615280704, -FILLET3_R * 0.02))
            Line((FILLET3_R * 0.680615280704, -FILLET3_R * 0.02), (FILLET3_R * 0.680615280704, 0))
        make_face()
    fillet3_piece_12b = extrude(amount=4.673338202, mode=Mode.PRIVATE)
    fillet3_piece_12b = split(fillet3_piece_12b, bisect_by=Plane(origin=(47.456505085, -48.357764725, 45.498358762), z_dir=(1, 0, 0)), keep=Keep.TOP, mode=Mode.PRIVATE)
    fillet3_piece_12 = fillet3_piece_12a & fillet3_piece_12b
    add(fillet3_piece_12)
    with BuildSketch(Plane(origin=(47.456505085, -50.763449611, 45.636932074), x_dir=(1, 0, 0), z_dir=(0, 1, 0))) as fillet3_piece_13a_section:
        with BuildLine():
            CenterArc((FILLET3_R, FILLET3_R), FILLET3_R, 180, 90)
            Line((0, FILLET3_R), (-FILLET3_R * 0.02, FILLET3_R))
            Line((-FILLET3_R * 0.02, FILLET3_R), (-FILLET3_R * 0.02, -FILLET3_R * 0.02))
            Line((-FILLET3_R * 0.02, -FILLET3_R * 0.02), (FILLET3_R, -FILLET3_R * 0.02))
            Line((FILLET3_R, -FILLET3_R * 0.02), (FILLET3_R, 0))
        make_face()
    fillet3_piece_13a = extrude(amount=26.3614, mode=Mode.PRIVATE)
    fillet3_piece_13a = split(fillet3_piece_13a, bisect_by=Plane(origin=(47.660195148, -26.514477634, 45.372103573), z_dir=(0, -1, 0)), keep=Keep.TOP, mode=Mode.PRIVATE)
    fillet3_piece_13a = split(fillet3_piece_13a, bisect_by=Plane(origin=(47.660195148, -26.973374036, 45.456053333), z_dir=(0, 0.9302870363838799, -0.36683242759616796)), keep=Keep.TOP, mode=Mode.PRIVATE)
    with BuildSketch(Plane(origin=(49.023158499, -26.902049611, 45.636932074), x_dir=(0, 1, 0), z_dir=(-1, 0, 0))) as fillet3_piece_13b_section:
        with BuildLine():
            CenterArc((0.700407326, 0.949807372), FILLET3_R, 201.520397017, 50.249417843)
            Line((-0.22987971, 0.582974945), (-0.248485451, 0.575638296))
            Line((-0.248485451, 0.575638296), (-0.018605741, -0.007336649))
            Line((-0.018605741, -0.007336649), (0, -0.02))
            ThreePointArc((0, -0.02), (0.193785989, -0.02), (0.38131527, -0.018996147))
            Line((0.38131527, -0.018996147), (0.387571977, 0))
        make_face()
    fillet3_piece_13b = extrude(amount=4.538453414, mode=Mode.PRIVATE)
    fillet3_piece_13b = split(fillet3_piece_13b, bisect_by=Plane(origin=(47.456505085, -26.864445024, 45.495418853), z_dir=(1, 0, 0)), keep=Keep.TOP, mode=Mode.PRIVATE)
    fillet3_piece_13 = fillet3_piece_13a & fillet3_piece_13b
    add(fillet3_piece_13)
    with BuildSketch(Plane(origin=(49.19185167, -26.902049611, 45.636932074), x_dir=(0, 1, 0), z_dir=(1, 0, 0))) as fillet3_piece_14a_section:
        with BuildLine():
            CenterArc((0.700407326, -0.949807372), FILLET3_R, 108.23018514, 50.249417843)
            Line((-0.22987971, -0.582974945), (-0.248485451, -0.575638296))
            Line((-0.248485451, -0.575638296), (-0.018605741, 0.007336649))
            Line((-0.018605741, 0.007336649), (0, 0.02))
            ThreePointArc((0, 0.02), (0.193785989, 0.02), (0.38131527, 0.018996147))
            Line((0.38131527, 0.018996147), (0.387571977, 0))
        make_face()
    fillet3_piece_14a = extrude(amount=4.538453414, mode=Mode.PRIVATE)
    fillet3_piece_14a = split(fillet3_piece_14a, bisect_by=Plane(origin=(50.758505085, -26.864445024, 45.495418853), z_dir=(-1, 0, 0)), keep=Keep.TOP, mode=Mode.PRIVATE)
    with BuildSketch(Plane(origin=(50.758505085, -24.402049611, 45.636932074), x_dir=(-1, 0, 0), z_dir=(0, -1, 0))) as fillet3_piece_14b_section:
        with BuildLine():
            CenterArc((FILLET3_R, FILLET3_R), FILLET3_R, 180, 90)
            Line((0, FILLET3_R), (-FILLET3_R * 0.02, FILLET3_R))
            Line((-FILLET3_R * 0.02, FILLET3_R), (-FILLET3_R * 0.02, -FILLET3_R * 0.02))
            Line((-FILLET3_R * 0.02, -FILLET3_R * 0.02), (FILLET3_R, -FILLET3_R * 0.02))
            Line((FILLET3_R, -FILLET3_R * 0.02), (FILLET3_R, 0))
        make_face()
    fillet3_piece_14b = extrude(amount=26.3614, mode=Mode.PRIVATE)
    fillet3_piece_14b = split(fillet3_piece_14b, bisect_by=Plane(origin=(50.554815021, -26.514477634, 45.372103573), z_dir=(0, -1, 0)), keep=Keep.TOP, mode=Mode.PRIVATE)
    fillet3_piece_14b = split(fillet3_piece_14b, bisect_by=Plane(origin=(50.554815021, -26.973374036, 45.456053333), z_dir=(0, 0.9302870363838799, -0.36683242759616835)), keep=Keep.TOP, mode=Mode.PRIVATE)
    fillet3_piece_14 = fillet3_piece_14a & fillet3_piece_14b
    add(fillet3_piece_14)
    with BuildSketch(Plane(origin=(50.758505085, -24.402049611, 45.636932074), x_dir=(-1, 0, 0), z_dir=(0, -1, 0))) as fillet3_piece_15a_section:
        with BuildLine():
            CenterArc((FILLET3_R, FILLET3_R), FILLET3_R, 180, 90)
            Line((0, FILLET3_R), (-FILLET3_R * 0.02, FILLET3_R))
            Line((-FILLET3_R * 0.02, FILLET3_R), (-FILLET3_R * 0.02, -FILLET3_R * 0.02))
            Line((-FILLET3_R * 0.02, -FILLET3_R * 0.02), (FILLET3_R, -FILLET3_R * 0.02))
            Line((FILLET3_R, -FILLET3_R * 0.02), (FILLET3_R, 0))
        make_face()
    fillet3_piece_15a = extrude(amount=26.3614, mode=Mode.PRIVATE)
    fillet3_piece_15a = split(fillet3_piece_15a, bisect_by=Plane(origin=(50.536291368, -48.345787947, 45.845742093), z_dir=(0, -0.9302870363838802, -0.36683242759616724)), keep=Keep.TOP, mode=Mode.PRIVATE)
    with BuildSketch(Plane(origin=(49.056966883, -48.263449611, 45.636932074), x_dir=(0, -1, 0), z_dir=(1, 0, 0))) as fillet3_piece_15b_section:
        with BuildLine():
            CenterArc((FILLET3_R * 0.680615280704, FILLET3_R), FILLET3_R, 201.520397017, 68.479602983)
            Line((-FILLET3_R * 0.24967175568, FILLET3_R * 0.633167572404), (-FILLET3_R * 0.268277496407, FILLET3_R * 0.625830923852))
            Line((-FILLET3_R * 0.268277496407, FILLET3_R * 0.625830923852), (-FILLET3_R * 0.0136123056141, -FILLET3_R * 0.02))
            Line((-FILLET3_R * 0.0136123056141, -FILLET3_R * 0.02), (FILLET3_R * 0.680615280704, -FILLET3_R * 0.02))
            Line((FILLET3_R * 0.680615280704, -FILLET3_R * 0.02), (FILLET3_R * 0.680615280704, 0))
        make_face()
    fillet3_piece_15b = extrude(amount=4.673338202, mode=Mode.PRIVATE)
    fillet3_piece_15b = split(fillet3_piece_15b, bisect_by=Plane(origin=(50.758505085, -48.357764725, 45.498358762), z_dir=(-1, 0, 0)), keep=Keep.TOP, mode=Mode.PRIVATE)
    fillet3_piece_15 = fillet3_piece_15a & fillet3_piece_15b
    add(fillet3_piece_15)
    with BuildSketch(Plane(origin=(50.758505085, -26.902049611, 45.636932074), x_dir=(0, 1, 0), z_dir=(1, 0, 0))) as fillet3_piece_16a_section:
        with BuildLine():
            CenterArc((0.700407326, -0.949807372), FILLET3_R, 108.23018514, 50.249417843)
            Line((-0.22987971, -0.582974945), (-0.248485451, -0.575638296))
            Line((-0.248485451, -0.575638296), (-0.018605741, 0.007336649))
            Line((-0.018605741, 0.007336649), (0, 0.02))
            ThreePointArc((0, 0.02), (0.193785989, 0.02), (0.38131527, 0.018996147))
            Line((0.38131527, 0.018996147), (0.387571977, 0))
        make_face()
    fillet3_piece_16a = extrude(amount=4.538453414, mode=Mode.PRIVATE)
    fillet3_piece_16a = split(fillet3_piece_16a, bisect_by=Plane(origin=(53.730305085, -26.864445024, 45.495418853), z_dir=(1, 0, 0)), keep=Keep.TOP, mode=Mode.PRIVATE)
    with BuildSketch(Plane(origin=(53.730305085, -50.763449611, 45.636932074), x_dir=(1, 0, 0), z_dir=(0, 1, 0))) as fillet3_piece_16b_section:
        with BuildLine():
            CenterArc((FILLET3_R, FILLET3_R), FILLET3_R, 180, 90)
            Line((0, FILLET3_R), (-FILLET3_R * 0.02, FILLET3_R))
            Line((-FILLET3_R * 0.02, FILLET3_R), (-FILLET3_R * 0.02, -FILLET3_R * 0.02))
            Line((-FILLET3_R * 0.02, -FILLET3_R * 0.02), (FILLET3_R, -FILLET3_R * 0.02))
            Line((FILLET3_R, -FILLET3_R * 0.02), (FILLET3_R, 0))
        make_face()
    fillet3_piece_16b = extrude(amount=26.3614, mode=Mode.PRIVATE)
    fillet3_piece_16b = split(fillet3_piece_16b, bisect_by=Plane(origin=(53.933995148, -26.514477634, 45.372103573), z_dir=(0, -1, 0)), keep=Keep.TOP, mode=Mode.PRIVATE)
    fillet3_piece_16b = split(fillet3_piece_16b, bisect_by=Plane(origin=(53.933995148, -26.973374036, 45.456053333), z_dir=(0, 0.9302870363838799, -0.36683242759616835)), keep=Keep.TOP, mode=Mode.PRIVATE)
    fillet3_piece_16 = fillet3_piece_16a & fillet3_piece_16b
    add(fillet3_piece_16)
    with BuildSketch(Plane(origin=(53.730305085, -50.763449611, 45.636932074), x_dir=(1, 0, 0), z_dir=(0, 1, 0))) as fillet3_piece_17a_section:
        with BuildLine():
            CenterArc((FILLET3_R, FILLET3_R), FILLET3_R, 180, 90)
            Line((0, FILLET3_R), (-FILLET3_R * 0.02, FILLET3_R))
            Line((-FILLET3_R * 0.02, FILLET3_R), (-FILLET3_R * 0.02, -FILLET3_R * 0.02))
            Line((-FILLET3_R * 0.02, -FILLET3_R * 0.02), (FILLET3_R, -FILLET3_R * 0.02))
            Line((FILLET3_R, -FILLET3_R * 0.02), (FILLET3_R, 0))
        make_face()
    fillet3_piece_17a = extrude(amount=26.3614, mode=Mode.PRIVATE)
    fillet3_piece_17a = split(fillet3_piece_17a, bisect_by=Plane(origin=(53.952518801, -48.345787947, 45.845742093), z_dir=(0, -0.9302870363838802, -0.36683242759616724)), keep=Keep.TOP, mode=Mode.PRIVATE)
    with BuildSketch(Plane(origin=(50.758505085, -48.263449611, 45.636932074), x_dir=(0, -1, 0), z_dir=(1, 0, 0))) as fillet3_piece_17b_section:
        with BuildLine():
            CenterArc((FILLET3_R * 0.680615280704, FILLET3_R), FILLET3_R, 201.520397017, 68.479602983)
            Line((-FILLET3_R * 0.24967175568, FILLET3_R * 0.633167572404), (-FILLET3_R * 0.268277496407, FILLET3_R * 0.625830923852))
            Line((-FILLET3_R * 0.268277496407, FILLET3_R * 0.625830923852), (-FILLET3_R * 0.0136123056141, -FILLET3_R * 0.02))
            Line((-FILLET3_R * 0.0136123056141, -FILLET3_R * 0.02), (FILLET3_R * 0.680615280704, -FILLET3_R * 0.02))
            Line((FILLET3_R * 0.680615280704, -FILLET3_R * 0.02), (FILLET3_R * 0.680615280704, 0))
        make_face()
    fillet3_piece_17b = extrude(amount=4.673338202, mode=Mode.PRIVATE)
    fillet3_piece_17b = split(fillet3_piece_17b, bisect_by=Plane(origin=(53.730305085, -48.357764725, 45.498358762), z_dir=(1, 0, 0)), keep=Keep.TOP, mode=Mode.PRIVATE)
    fillet3_piece_17 = fillet3_piece_17a & fillet3_piece_17b
    add(fillet3_piece_17)


solid = part.part
